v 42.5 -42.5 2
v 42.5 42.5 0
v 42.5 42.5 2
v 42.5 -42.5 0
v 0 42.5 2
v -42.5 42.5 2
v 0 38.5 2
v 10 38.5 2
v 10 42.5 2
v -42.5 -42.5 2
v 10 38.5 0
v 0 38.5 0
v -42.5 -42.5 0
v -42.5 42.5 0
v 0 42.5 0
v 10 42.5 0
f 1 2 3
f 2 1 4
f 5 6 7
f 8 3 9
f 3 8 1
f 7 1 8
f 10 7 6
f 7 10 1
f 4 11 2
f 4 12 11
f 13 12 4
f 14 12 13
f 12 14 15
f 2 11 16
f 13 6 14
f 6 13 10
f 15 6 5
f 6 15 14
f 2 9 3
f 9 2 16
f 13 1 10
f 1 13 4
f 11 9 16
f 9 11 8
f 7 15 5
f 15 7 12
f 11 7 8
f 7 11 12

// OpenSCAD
// Sowing template for 90mm Petri dish - flat disc with grid holes and orientation notch.

// Dimensions
DISH_DIA = 90;
DISC_DIA = 85;
THICKNESS = 2;
HOLE_COUNT = 7;
HOLE_DIA = 3;
HOLE_SPACING = 9;
NOTCH_WIDTH = 10;
NOTCH_DEPTH = 4;

$fn = 64;

// Calculate grid offsets to center the grid on the origin
// For 7 holes, indices are 0..6. Center index is 3.
// Offset = (index - 3) * spacing
grid_offset = (HOLE_COUNT - 1) / 2 * HOLE_SPACING;

difference() {
    // Main disc body
    translate([-DISC_DIA / 2, -DISC_DIA / 2, 0])
        cube([DISC_DIA, DISC_DIA, THICKNESS]);

    // Grid of holes
    for (i = [0 : HOLE_COUNT - 1]) {
        x_pos = (i - grid_offset) * HOLE_SPACING;
        
        // Cut hole through the entire thickness
        translate([x_pos, 0, -1])
            cylinder(h = THICKNESS + 2, d = HOLE_DIA);
    }

    // Orientation notch on the +Y side
    // Notch is centered on Y axis, so its center Y is 0.
    // It extends from -NOTCH_WIDTH/2 to +NOTCH_WIDTH/2 in X.
    // It cuts into the disc from the rim inward.
    // Rim Y is DISC_DIA/2. Notch starts at DISC_DIA/2 - NOTCH_DEPTH.
    
    notch_y_start = DISC_DIA / 2 - NOTCH_DEPTH;
    
    // Create the notch shape (a rectangular prism)
    // We position it so it cuts into the disc.
    // The notch is 10mm wide in X, centered at X=0.
    // The notch is 4mm deep in Y, starting at Y = notch_y_start.
    // The notch has the full thickness of the disc (plus a bit to ensure clean cut).
    // Position: X=0, Y=notch_y_start, Z=-1 (below bed)
    // Size: X=NOTCH_WIDTH, Y=NOTCH_DEPTH, Z=THICKNESS+2
    
    translate([0, notch_y_start, -1])
        cube([NOTCH_WIDTH, NOTCH_DEPTH, THICKNESS + 2]);
}
